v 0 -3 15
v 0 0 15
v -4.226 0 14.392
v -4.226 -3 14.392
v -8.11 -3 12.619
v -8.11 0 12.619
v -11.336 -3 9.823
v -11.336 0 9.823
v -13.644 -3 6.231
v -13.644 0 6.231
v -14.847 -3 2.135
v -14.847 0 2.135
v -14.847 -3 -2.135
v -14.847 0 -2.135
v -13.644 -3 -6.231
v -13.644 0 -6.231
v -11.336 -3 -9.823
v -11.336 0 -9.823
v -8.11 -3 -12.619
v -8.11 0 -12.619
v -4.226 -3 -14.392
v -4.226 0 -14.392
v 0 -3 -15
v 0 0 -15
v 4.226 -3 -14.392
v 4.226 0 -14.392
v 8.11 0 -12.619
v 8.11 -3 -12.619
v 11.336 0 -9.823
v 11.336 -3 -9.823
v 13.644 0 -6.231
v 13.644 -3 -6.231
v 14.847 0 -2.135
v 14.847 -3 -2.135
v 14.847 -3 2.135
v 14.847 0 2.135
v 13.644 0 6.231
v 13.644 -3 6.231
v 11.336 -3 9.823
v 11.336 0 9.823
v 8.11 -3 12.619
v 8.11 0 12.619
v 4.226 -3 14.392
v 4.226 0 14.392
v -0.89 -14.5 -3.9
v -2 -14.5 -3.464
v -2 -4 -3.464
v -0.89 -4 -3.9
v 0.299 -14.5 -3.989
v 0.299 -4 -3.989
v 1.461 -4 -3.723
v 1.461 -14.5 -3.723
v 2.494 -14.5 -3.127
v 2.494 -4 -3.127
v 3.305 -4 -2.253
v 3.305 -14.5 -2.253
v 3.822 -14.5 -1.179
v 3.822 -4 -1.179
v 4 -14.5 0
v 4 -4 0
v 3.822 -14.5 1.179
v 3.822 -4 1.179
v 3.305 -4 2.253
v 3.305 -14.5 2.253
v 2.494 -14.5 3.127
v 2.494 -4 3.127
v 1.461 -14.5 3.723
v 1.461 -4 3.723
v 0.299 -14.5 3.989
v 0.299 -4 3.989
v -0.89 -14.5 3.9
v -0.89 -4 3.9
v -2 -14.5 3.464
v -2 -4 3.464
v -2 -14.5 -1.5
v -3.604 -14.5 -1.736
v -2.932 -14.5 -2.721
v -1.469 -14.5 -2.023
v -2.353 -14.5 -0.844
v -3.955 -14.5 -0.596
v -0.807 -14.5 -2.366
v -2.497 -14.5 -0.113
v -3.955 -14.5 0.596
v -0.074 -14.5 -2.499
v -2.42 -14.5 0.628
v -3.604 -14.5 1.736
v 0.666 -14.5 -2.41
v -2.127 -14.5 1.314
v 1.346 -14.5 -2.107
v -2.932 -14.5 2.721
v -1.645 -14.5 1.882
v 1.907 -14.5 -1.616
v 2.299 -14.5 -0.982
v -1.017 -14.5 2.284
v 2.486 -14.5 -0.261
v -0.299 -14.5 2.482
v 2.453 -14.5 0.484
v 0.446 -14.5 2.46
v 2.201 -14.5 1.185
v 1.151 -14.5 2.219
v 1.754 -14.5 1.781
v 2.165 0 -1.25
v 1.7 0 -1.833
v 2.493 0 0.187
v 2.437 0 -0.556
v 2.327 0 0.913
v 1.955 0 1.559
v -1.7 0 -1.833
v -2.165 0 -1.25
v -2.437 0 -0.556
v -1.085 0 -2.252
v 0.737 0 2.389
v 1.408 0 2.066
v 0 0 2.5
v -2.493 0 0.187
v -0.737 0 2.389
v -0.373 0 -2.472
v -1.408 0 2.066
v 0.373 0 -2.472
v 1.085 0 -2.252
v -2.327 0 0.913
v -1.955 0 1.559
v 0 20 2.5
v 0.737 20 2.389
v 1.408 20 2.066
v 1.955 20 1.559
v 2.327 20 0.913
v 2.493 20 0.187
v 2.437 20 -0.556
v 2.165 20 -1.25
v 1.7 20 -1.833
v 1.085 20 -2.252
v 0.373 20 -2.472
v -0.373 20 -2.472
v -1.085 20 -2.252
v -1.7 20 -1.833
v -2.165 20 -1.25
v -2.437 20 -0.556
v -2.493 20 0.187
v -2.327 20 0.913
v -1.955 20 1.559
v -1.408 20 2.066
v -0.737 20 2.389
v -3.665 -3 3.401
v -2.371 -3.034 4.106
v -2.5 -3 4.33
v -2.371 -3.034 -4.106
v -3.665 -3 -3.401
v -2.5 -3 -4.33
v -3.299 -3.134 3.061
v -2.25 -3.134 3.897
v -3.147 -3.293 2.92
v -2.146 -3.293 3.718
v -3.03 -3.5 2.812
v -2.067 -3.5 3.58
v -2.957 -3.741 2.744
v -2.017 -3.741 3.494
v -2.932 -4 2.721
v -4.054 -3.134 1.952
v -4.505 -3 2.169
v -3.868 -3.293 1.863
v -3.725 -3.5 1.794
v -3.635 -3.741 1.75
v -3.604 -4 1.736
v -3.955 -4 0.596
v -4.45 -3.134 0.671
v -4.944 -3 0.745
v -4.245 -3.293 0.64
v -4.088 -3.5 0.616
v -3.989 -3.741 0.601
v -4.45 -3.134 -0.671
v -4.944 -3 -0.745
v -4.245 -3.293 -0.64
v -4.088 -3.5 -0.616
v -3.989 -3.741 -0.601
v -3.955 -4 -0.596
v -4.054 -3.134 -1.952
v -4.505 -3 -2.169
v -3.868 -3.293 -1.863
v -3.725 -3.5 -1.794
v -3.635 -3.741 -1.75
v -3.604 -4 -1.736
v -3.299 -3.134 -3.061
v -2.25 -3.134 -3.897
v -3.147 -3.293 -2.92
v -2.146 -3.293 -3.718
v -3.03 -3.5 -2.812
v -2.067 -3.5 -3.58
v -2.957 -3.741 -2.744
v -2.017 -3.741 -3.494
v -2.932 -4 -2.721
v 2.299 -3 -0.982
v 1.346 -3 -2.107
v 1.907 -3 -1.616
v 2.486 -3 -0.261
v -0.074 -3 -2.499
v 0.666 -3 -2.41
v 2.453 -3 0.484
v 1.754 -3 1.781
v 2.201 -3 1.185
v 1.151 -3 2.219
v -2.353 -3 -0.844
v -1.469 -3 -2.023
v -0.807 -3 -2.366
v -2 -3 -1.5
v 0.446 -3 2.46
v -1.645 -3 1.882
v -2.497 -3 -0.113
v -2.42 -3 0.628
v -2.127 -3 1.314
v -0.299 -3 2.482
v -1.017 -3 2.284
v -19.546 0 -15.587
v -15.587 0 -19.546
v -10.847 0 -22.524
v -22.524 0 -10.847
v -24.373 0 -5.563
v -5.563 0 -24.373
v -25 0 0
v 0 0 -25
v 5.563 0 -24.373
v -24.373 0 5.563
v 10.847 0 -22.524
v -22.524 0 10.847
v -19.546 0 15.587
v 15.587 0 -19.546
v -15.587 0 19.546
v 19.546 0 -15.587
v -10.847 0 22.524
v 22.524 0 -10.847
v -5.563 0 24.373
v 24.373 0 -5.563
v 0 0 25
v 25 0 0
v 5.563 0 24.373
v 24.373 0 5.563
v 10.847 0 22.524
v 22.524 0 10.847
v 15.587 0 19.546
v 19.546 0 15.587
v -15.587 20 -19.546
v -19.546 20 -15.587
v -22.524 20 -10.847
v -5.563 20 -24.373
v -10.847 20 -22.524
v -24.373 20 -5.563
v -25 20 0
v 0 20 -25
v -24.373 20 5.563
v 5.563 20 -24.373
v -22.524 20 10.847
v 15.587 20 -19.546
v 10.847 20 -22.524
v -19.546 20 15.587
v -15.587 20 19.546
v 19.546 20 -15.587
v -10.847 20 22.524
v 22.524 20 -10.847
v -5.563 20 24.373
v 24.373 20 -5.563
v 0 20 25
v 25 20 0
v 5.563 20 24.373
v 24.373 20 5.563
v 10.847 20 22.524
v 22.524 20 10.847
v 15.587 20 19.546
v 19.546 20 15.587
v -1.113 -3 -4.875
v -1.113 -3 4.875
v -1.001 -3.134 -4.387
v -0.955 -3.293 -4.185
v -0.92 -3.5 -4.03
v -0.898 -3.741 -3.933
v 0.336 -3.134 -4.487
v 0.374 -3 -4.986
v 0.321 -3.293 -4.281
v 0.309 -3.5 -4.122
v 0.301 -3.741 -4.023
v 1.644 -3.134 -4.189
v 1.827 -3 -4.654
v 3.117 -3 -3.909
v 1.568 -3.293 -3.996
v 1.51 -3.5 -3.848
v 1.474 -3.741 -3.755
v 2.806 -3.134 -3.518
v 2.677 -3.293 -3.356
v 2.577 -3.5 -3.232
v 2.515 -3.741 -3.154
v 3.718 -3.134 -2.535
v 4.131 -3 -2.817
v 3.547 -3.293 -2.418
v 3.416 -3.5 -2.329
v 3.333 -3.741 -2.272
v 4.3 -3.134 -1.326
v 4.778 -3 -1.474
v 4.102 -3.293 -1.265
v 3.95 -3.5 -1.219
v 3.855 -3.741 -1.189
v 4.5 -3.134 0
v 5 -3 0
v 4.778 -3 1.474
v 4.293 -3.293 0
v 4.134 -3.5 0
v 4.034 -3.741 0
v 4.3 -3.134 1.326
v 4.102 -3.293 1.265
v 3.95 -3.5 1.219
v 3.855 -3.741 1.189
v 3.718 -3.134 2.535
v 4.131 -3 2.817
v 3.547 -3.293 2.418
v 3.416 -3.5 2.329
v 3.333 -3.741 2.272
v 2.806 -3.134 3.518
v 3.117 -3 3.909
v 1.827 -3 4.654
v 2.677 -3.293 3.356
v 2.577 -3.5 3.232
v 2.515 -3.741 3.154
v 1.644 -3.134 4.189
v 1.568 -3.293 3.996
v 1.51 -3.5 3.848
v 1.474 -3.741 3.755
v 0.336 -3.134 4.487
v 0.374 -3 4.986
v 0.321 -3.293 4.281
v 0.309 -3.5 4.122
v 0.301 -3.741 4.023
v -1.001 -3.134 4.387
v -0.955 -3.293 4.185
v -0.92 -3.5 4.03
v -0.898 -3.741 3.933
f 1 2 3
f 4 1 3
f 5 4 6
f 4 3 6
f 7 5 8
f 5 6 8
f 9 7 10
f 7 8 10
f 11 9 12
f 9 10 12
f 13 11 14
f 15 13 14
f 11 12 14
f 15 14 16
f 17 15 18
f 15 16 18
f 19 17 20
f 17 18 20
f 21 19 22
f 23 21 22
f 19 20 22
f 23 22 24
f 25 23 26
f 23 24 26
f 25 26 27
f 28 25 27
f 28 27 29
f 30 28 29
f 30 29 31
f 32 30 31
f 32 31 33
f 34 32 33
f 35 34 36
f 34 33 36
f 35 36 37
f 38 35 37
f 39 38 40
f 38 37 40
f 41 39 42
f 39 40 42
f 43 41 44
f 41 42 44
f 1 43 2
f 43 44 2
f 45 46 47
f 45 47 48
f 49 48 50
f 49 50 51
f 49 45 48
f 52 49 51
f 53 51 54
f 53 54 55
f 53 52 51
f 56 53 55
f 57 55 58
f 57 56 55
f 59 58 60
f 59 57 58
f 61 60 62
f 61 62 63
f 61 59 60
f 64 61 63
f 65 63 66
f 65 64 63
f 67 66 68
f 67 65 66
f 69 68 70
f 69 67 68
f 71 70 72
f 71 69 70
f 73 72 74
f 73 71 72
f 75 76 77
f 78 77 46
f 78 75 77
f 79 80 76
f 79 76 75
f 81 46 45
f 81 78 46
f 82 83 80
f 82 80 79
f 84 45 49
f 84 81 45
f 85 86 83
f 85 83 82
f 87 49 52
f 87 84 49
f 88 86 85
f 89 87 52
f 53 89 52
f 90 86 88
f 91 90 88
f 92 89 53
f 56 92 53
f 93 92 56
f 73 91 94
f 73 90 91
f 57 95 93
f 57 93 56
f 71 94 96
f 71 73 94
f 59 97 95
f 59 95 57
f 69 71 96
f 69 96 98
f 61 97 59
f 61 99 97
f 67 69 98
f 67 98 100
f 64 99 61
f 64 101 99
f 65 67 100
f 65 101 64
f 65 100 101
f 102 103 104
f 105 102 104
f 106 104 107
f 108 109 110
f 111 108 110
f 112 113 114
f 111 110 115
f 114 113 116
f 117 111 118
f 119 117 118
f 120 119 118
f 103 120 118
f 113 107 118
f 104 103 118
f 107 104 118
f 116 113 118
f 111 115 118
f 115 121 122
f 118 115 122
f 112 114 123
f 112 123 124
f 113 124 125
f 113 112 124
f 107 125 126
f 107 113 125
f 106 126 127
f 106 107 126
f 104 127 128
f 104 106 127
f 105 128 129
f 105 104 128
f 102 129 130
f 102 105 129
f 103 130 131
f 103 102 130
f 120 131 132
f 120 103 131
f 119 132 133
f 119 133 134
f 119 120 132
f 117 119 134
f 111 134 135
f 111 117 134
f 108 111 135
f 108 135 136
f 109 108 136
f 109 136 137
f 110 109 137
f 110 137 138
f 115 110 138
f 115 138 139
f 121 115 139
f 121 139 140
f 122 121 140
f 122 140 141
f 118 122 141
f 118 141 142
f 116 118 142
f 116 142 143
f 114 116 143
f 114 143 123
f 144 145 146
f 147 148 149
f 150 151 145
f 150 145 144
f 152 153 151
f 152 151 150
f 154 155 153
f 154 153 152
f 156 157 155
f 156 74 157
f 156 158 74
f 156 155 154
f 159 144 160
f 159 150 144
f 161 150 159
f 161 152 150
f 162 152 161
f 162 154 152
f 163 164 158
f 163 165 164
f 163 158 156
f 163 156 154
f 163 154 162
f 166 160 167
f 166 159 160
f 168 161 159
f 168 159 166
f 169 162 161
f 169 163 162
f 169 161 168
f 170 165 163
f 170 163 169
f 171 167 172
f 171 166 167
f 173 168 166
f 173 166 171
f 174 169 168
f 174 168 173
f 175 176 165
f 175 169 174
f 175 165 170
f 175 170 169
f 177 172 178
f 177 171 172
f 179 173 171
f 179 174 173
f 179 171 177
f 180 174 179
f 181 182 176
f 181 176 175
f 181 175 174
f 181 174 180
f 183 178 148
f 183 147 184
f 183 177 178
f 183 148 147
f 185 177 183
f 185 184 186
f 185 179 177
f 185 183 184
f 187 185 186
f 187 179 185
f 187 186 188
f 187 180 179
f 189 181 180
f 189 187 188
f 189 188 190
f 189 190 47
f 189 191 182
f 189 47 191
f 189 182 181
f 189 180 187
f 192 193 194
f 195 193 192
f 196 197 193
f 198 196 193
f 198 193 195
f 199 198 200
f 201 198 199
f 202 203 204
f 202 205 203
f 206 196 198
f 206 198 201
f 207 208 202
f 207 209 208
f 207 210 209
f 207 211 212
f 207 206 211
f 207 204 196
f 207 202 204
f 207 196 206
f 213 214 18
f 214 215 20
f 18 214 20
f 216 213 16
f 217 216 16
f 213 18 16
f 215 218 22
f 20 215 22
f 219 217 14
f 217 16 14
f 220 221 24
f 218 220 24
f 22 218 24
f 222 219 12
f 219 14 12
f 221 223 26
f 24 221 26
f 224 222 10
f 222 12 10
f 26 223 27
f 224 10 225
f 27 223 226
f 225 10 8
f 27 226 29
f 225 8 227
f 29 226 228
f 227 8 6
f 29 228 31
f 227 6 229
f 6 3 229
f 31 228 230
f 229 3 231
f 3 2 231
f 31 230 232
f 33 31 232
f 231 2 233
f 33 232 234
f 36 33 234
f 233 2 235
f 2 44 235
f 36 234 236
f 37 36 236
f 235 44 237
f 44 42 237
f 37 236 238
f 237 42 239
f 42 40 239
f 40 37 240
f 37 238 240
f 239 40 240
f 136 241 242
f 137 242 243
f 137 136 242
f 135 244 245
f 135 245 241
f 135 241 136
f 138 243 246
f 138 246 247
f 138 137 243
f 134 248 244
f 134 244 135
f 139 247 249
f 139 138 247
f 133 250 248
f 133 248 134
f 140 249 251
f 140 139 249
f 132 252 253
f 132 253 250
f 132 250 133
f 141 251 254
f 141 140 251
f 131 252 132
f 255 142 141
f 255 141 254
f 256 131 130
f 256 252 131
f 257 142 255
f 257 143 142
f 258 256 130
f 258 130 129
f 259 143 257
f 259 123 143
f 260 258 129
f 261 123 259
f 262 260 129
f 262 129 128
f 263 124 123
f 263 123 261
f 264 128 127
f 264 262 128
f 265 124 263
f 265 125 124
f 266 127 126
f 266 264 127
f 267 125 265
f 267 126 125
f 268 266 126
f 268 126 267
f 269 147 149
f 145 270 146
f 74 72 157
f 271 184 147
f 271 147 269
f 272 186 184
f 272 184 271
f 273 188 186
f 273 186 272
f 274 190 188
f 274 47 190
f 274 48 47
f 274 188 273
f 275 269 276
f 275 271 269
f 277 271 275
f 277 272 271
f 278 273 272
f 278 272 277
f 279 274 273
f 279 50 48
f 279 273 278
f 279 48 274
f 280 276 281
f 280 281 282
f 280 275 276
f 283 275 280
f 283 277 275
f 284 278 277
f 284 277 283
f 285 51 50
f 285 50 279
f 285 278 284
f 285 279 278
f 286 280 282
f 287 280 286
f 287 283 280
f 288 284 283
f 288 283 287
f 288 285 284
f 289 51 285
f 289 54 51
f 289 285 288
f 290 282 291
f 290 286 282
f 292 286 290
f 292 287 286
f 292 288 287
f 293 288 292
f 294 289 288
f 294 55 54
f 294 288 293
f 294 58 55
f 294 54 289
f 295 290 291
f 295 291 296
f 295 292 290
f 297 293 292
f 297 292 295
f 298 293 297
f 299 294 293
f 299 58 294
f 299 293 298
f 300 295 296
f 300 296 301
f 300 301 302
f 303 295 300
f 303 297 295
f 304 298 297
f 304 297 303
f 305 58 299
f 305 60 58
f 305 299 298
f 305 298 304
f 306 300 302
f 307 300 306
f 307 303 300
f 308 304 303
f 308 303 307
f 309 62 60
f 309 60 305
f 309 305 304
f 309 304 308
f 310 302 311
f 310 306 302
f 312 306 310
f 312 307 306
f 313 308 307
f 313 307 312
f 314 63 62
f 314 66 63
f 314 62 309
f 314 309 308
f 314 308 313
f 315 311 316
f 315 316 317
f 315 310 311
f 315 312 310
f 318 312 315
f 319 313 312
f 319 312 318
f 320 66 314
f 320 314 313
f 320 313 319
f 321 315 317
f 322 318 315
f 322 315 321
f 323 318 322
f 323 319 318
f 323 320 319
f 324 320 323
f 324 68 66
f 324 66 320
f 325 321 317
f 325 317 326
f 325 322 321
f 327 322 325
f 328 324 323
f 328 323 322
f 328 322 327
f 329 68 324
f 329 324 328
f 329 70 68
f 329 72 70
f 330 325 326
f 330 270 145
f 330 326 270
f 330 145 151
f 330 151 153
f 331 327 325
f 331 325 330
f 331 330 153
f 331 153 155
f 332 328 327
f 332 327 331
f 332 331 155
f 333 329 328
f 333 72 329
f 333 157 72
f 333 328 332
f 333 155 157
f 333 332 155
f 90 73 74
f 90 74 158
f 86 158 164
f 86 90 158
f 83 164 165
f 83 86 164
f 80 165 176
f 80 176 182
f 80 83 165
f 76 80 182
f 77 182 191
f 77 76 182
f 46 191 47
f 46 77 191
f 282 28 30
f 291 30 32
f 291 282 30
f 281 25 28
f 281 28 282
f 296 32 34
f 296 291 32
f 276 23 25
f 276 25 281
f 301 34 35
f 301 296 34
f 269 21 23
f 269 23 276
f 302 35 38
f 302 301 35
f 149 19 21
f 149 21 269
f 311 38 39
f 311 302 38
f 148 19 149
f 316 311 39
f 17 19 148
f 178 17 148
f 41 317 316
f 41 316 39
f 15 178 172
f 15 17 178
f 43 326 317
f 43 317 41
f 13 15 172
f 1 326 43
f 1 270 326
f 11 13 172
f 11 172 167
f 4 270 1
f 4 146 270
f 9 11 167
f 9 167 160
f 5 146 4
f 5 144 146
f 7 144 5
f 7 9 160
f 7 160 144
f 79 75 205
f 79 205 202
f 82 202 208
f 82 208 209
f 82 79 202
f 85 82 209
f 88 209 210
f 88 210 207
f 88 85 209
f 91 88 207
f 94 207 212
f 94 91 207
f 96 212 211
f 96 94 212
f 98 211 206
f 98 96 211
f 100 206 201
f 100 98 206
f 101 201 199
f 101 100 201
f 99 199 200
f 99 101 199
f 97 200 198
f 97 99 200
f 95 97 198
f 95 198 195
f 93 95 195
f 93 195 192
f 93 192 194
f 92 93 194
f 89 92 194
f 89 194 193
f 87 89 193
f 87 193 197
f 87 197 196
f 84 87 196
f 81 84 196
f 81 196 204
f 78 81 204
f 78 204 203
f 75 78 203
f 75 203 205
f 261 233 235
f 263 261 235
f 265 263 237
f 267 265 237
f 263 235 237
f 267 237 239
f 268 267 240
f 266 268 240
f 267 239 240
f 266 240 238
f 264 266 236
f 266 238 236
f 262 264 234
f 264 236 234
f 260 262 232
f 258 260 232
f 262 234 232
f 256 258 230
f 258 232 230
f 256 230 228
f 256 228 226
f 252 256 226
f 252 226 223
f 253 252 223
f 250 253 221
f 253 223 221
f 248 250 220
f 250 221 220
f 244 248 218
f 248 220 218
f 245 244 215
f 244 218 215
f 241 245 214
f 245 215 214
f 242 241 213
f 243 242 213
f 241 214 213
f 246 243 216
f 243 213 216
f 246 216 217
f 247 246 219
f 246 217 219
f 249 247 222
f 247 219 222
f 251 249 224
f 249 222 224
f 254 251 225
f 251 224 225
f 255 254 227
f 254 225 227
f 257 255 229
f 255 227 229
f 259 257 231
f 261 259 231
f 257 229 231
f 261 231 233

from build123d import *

# Parameters (mm, degrees)
SKETCH1_R           = 25
SKETCH1_R_2         = 2.5
BOSS_EXTRUDE1_DEPTH = 20
BOSS_EXTRUDE3_START = 14.5
BOSS_EXTRUDE3_DEPTH = 14.5
SKETCH7_R           = 15
BOSS_EXTRUDE4_DEPTH = 3
FILLET1_R           = 1


with BuildPart() as part:
    # Sketch1 → Boss-Extrude1 (new body)
    with BuildSketch(Plane(origin=(0, 0, 0), x_dir=(1, 0, 0), z_dir=(0, 1, 0))):
        with Locations(Location((0, 0, 0), (0, 0, 270))):
            Circle(SKETCH1_R)
        with Locations(Location((0, 0, 0), (0, 0, 270))):
            Circle(SKETCH1_R_2, mode=Mode.SUBTRACT)
    extrude(amount=BOSS_EXTRUDE1_DEPTH)

    # Sketch2 → Boss-Extrude3 (add)
    with BuildSketch(Plane.XZ.offset(BOSS_EXTRUDE3_START)):
        with BuildLine():
            ThreePointArc((-2, 3.464101615), (-4, 0), (-2, -3.464101615))
            ThreePointArc((-2, -3.464101615), (4, 0), (-2, 3.464101615))
        make_face()
        with BuildLine():
            ThreePointArc((-2, 1.5), (2.5, 0), (-2, -1.5))
            ThreePointArc((-2, -1.5), (-2.5, 0), (-2, 1.5))
        make_face(mode=Mode.SUBTRACT)
    extrude(amount=-BOSS_EXTRUDE3_DEPTH)

    # Sketch7 → Boss-Extrude4 (add)
    with BuildSketch(Plane.XZ):
        with Locations(Location((0, 0, 0), (0, 0, 90))):
            Circle(SKETCH7_R)
    extrude(amount=BOSS_EXTRUDE4_DEPTH)

    # Fillet1
    fillet1_edges = [part.edges().sort_by_distance(p)[0] for p in [
        (2, -3, -3.464101615),
    ]]
    fillet(fillet1_edges, radius=FILLET1_R)


solid = part.part
